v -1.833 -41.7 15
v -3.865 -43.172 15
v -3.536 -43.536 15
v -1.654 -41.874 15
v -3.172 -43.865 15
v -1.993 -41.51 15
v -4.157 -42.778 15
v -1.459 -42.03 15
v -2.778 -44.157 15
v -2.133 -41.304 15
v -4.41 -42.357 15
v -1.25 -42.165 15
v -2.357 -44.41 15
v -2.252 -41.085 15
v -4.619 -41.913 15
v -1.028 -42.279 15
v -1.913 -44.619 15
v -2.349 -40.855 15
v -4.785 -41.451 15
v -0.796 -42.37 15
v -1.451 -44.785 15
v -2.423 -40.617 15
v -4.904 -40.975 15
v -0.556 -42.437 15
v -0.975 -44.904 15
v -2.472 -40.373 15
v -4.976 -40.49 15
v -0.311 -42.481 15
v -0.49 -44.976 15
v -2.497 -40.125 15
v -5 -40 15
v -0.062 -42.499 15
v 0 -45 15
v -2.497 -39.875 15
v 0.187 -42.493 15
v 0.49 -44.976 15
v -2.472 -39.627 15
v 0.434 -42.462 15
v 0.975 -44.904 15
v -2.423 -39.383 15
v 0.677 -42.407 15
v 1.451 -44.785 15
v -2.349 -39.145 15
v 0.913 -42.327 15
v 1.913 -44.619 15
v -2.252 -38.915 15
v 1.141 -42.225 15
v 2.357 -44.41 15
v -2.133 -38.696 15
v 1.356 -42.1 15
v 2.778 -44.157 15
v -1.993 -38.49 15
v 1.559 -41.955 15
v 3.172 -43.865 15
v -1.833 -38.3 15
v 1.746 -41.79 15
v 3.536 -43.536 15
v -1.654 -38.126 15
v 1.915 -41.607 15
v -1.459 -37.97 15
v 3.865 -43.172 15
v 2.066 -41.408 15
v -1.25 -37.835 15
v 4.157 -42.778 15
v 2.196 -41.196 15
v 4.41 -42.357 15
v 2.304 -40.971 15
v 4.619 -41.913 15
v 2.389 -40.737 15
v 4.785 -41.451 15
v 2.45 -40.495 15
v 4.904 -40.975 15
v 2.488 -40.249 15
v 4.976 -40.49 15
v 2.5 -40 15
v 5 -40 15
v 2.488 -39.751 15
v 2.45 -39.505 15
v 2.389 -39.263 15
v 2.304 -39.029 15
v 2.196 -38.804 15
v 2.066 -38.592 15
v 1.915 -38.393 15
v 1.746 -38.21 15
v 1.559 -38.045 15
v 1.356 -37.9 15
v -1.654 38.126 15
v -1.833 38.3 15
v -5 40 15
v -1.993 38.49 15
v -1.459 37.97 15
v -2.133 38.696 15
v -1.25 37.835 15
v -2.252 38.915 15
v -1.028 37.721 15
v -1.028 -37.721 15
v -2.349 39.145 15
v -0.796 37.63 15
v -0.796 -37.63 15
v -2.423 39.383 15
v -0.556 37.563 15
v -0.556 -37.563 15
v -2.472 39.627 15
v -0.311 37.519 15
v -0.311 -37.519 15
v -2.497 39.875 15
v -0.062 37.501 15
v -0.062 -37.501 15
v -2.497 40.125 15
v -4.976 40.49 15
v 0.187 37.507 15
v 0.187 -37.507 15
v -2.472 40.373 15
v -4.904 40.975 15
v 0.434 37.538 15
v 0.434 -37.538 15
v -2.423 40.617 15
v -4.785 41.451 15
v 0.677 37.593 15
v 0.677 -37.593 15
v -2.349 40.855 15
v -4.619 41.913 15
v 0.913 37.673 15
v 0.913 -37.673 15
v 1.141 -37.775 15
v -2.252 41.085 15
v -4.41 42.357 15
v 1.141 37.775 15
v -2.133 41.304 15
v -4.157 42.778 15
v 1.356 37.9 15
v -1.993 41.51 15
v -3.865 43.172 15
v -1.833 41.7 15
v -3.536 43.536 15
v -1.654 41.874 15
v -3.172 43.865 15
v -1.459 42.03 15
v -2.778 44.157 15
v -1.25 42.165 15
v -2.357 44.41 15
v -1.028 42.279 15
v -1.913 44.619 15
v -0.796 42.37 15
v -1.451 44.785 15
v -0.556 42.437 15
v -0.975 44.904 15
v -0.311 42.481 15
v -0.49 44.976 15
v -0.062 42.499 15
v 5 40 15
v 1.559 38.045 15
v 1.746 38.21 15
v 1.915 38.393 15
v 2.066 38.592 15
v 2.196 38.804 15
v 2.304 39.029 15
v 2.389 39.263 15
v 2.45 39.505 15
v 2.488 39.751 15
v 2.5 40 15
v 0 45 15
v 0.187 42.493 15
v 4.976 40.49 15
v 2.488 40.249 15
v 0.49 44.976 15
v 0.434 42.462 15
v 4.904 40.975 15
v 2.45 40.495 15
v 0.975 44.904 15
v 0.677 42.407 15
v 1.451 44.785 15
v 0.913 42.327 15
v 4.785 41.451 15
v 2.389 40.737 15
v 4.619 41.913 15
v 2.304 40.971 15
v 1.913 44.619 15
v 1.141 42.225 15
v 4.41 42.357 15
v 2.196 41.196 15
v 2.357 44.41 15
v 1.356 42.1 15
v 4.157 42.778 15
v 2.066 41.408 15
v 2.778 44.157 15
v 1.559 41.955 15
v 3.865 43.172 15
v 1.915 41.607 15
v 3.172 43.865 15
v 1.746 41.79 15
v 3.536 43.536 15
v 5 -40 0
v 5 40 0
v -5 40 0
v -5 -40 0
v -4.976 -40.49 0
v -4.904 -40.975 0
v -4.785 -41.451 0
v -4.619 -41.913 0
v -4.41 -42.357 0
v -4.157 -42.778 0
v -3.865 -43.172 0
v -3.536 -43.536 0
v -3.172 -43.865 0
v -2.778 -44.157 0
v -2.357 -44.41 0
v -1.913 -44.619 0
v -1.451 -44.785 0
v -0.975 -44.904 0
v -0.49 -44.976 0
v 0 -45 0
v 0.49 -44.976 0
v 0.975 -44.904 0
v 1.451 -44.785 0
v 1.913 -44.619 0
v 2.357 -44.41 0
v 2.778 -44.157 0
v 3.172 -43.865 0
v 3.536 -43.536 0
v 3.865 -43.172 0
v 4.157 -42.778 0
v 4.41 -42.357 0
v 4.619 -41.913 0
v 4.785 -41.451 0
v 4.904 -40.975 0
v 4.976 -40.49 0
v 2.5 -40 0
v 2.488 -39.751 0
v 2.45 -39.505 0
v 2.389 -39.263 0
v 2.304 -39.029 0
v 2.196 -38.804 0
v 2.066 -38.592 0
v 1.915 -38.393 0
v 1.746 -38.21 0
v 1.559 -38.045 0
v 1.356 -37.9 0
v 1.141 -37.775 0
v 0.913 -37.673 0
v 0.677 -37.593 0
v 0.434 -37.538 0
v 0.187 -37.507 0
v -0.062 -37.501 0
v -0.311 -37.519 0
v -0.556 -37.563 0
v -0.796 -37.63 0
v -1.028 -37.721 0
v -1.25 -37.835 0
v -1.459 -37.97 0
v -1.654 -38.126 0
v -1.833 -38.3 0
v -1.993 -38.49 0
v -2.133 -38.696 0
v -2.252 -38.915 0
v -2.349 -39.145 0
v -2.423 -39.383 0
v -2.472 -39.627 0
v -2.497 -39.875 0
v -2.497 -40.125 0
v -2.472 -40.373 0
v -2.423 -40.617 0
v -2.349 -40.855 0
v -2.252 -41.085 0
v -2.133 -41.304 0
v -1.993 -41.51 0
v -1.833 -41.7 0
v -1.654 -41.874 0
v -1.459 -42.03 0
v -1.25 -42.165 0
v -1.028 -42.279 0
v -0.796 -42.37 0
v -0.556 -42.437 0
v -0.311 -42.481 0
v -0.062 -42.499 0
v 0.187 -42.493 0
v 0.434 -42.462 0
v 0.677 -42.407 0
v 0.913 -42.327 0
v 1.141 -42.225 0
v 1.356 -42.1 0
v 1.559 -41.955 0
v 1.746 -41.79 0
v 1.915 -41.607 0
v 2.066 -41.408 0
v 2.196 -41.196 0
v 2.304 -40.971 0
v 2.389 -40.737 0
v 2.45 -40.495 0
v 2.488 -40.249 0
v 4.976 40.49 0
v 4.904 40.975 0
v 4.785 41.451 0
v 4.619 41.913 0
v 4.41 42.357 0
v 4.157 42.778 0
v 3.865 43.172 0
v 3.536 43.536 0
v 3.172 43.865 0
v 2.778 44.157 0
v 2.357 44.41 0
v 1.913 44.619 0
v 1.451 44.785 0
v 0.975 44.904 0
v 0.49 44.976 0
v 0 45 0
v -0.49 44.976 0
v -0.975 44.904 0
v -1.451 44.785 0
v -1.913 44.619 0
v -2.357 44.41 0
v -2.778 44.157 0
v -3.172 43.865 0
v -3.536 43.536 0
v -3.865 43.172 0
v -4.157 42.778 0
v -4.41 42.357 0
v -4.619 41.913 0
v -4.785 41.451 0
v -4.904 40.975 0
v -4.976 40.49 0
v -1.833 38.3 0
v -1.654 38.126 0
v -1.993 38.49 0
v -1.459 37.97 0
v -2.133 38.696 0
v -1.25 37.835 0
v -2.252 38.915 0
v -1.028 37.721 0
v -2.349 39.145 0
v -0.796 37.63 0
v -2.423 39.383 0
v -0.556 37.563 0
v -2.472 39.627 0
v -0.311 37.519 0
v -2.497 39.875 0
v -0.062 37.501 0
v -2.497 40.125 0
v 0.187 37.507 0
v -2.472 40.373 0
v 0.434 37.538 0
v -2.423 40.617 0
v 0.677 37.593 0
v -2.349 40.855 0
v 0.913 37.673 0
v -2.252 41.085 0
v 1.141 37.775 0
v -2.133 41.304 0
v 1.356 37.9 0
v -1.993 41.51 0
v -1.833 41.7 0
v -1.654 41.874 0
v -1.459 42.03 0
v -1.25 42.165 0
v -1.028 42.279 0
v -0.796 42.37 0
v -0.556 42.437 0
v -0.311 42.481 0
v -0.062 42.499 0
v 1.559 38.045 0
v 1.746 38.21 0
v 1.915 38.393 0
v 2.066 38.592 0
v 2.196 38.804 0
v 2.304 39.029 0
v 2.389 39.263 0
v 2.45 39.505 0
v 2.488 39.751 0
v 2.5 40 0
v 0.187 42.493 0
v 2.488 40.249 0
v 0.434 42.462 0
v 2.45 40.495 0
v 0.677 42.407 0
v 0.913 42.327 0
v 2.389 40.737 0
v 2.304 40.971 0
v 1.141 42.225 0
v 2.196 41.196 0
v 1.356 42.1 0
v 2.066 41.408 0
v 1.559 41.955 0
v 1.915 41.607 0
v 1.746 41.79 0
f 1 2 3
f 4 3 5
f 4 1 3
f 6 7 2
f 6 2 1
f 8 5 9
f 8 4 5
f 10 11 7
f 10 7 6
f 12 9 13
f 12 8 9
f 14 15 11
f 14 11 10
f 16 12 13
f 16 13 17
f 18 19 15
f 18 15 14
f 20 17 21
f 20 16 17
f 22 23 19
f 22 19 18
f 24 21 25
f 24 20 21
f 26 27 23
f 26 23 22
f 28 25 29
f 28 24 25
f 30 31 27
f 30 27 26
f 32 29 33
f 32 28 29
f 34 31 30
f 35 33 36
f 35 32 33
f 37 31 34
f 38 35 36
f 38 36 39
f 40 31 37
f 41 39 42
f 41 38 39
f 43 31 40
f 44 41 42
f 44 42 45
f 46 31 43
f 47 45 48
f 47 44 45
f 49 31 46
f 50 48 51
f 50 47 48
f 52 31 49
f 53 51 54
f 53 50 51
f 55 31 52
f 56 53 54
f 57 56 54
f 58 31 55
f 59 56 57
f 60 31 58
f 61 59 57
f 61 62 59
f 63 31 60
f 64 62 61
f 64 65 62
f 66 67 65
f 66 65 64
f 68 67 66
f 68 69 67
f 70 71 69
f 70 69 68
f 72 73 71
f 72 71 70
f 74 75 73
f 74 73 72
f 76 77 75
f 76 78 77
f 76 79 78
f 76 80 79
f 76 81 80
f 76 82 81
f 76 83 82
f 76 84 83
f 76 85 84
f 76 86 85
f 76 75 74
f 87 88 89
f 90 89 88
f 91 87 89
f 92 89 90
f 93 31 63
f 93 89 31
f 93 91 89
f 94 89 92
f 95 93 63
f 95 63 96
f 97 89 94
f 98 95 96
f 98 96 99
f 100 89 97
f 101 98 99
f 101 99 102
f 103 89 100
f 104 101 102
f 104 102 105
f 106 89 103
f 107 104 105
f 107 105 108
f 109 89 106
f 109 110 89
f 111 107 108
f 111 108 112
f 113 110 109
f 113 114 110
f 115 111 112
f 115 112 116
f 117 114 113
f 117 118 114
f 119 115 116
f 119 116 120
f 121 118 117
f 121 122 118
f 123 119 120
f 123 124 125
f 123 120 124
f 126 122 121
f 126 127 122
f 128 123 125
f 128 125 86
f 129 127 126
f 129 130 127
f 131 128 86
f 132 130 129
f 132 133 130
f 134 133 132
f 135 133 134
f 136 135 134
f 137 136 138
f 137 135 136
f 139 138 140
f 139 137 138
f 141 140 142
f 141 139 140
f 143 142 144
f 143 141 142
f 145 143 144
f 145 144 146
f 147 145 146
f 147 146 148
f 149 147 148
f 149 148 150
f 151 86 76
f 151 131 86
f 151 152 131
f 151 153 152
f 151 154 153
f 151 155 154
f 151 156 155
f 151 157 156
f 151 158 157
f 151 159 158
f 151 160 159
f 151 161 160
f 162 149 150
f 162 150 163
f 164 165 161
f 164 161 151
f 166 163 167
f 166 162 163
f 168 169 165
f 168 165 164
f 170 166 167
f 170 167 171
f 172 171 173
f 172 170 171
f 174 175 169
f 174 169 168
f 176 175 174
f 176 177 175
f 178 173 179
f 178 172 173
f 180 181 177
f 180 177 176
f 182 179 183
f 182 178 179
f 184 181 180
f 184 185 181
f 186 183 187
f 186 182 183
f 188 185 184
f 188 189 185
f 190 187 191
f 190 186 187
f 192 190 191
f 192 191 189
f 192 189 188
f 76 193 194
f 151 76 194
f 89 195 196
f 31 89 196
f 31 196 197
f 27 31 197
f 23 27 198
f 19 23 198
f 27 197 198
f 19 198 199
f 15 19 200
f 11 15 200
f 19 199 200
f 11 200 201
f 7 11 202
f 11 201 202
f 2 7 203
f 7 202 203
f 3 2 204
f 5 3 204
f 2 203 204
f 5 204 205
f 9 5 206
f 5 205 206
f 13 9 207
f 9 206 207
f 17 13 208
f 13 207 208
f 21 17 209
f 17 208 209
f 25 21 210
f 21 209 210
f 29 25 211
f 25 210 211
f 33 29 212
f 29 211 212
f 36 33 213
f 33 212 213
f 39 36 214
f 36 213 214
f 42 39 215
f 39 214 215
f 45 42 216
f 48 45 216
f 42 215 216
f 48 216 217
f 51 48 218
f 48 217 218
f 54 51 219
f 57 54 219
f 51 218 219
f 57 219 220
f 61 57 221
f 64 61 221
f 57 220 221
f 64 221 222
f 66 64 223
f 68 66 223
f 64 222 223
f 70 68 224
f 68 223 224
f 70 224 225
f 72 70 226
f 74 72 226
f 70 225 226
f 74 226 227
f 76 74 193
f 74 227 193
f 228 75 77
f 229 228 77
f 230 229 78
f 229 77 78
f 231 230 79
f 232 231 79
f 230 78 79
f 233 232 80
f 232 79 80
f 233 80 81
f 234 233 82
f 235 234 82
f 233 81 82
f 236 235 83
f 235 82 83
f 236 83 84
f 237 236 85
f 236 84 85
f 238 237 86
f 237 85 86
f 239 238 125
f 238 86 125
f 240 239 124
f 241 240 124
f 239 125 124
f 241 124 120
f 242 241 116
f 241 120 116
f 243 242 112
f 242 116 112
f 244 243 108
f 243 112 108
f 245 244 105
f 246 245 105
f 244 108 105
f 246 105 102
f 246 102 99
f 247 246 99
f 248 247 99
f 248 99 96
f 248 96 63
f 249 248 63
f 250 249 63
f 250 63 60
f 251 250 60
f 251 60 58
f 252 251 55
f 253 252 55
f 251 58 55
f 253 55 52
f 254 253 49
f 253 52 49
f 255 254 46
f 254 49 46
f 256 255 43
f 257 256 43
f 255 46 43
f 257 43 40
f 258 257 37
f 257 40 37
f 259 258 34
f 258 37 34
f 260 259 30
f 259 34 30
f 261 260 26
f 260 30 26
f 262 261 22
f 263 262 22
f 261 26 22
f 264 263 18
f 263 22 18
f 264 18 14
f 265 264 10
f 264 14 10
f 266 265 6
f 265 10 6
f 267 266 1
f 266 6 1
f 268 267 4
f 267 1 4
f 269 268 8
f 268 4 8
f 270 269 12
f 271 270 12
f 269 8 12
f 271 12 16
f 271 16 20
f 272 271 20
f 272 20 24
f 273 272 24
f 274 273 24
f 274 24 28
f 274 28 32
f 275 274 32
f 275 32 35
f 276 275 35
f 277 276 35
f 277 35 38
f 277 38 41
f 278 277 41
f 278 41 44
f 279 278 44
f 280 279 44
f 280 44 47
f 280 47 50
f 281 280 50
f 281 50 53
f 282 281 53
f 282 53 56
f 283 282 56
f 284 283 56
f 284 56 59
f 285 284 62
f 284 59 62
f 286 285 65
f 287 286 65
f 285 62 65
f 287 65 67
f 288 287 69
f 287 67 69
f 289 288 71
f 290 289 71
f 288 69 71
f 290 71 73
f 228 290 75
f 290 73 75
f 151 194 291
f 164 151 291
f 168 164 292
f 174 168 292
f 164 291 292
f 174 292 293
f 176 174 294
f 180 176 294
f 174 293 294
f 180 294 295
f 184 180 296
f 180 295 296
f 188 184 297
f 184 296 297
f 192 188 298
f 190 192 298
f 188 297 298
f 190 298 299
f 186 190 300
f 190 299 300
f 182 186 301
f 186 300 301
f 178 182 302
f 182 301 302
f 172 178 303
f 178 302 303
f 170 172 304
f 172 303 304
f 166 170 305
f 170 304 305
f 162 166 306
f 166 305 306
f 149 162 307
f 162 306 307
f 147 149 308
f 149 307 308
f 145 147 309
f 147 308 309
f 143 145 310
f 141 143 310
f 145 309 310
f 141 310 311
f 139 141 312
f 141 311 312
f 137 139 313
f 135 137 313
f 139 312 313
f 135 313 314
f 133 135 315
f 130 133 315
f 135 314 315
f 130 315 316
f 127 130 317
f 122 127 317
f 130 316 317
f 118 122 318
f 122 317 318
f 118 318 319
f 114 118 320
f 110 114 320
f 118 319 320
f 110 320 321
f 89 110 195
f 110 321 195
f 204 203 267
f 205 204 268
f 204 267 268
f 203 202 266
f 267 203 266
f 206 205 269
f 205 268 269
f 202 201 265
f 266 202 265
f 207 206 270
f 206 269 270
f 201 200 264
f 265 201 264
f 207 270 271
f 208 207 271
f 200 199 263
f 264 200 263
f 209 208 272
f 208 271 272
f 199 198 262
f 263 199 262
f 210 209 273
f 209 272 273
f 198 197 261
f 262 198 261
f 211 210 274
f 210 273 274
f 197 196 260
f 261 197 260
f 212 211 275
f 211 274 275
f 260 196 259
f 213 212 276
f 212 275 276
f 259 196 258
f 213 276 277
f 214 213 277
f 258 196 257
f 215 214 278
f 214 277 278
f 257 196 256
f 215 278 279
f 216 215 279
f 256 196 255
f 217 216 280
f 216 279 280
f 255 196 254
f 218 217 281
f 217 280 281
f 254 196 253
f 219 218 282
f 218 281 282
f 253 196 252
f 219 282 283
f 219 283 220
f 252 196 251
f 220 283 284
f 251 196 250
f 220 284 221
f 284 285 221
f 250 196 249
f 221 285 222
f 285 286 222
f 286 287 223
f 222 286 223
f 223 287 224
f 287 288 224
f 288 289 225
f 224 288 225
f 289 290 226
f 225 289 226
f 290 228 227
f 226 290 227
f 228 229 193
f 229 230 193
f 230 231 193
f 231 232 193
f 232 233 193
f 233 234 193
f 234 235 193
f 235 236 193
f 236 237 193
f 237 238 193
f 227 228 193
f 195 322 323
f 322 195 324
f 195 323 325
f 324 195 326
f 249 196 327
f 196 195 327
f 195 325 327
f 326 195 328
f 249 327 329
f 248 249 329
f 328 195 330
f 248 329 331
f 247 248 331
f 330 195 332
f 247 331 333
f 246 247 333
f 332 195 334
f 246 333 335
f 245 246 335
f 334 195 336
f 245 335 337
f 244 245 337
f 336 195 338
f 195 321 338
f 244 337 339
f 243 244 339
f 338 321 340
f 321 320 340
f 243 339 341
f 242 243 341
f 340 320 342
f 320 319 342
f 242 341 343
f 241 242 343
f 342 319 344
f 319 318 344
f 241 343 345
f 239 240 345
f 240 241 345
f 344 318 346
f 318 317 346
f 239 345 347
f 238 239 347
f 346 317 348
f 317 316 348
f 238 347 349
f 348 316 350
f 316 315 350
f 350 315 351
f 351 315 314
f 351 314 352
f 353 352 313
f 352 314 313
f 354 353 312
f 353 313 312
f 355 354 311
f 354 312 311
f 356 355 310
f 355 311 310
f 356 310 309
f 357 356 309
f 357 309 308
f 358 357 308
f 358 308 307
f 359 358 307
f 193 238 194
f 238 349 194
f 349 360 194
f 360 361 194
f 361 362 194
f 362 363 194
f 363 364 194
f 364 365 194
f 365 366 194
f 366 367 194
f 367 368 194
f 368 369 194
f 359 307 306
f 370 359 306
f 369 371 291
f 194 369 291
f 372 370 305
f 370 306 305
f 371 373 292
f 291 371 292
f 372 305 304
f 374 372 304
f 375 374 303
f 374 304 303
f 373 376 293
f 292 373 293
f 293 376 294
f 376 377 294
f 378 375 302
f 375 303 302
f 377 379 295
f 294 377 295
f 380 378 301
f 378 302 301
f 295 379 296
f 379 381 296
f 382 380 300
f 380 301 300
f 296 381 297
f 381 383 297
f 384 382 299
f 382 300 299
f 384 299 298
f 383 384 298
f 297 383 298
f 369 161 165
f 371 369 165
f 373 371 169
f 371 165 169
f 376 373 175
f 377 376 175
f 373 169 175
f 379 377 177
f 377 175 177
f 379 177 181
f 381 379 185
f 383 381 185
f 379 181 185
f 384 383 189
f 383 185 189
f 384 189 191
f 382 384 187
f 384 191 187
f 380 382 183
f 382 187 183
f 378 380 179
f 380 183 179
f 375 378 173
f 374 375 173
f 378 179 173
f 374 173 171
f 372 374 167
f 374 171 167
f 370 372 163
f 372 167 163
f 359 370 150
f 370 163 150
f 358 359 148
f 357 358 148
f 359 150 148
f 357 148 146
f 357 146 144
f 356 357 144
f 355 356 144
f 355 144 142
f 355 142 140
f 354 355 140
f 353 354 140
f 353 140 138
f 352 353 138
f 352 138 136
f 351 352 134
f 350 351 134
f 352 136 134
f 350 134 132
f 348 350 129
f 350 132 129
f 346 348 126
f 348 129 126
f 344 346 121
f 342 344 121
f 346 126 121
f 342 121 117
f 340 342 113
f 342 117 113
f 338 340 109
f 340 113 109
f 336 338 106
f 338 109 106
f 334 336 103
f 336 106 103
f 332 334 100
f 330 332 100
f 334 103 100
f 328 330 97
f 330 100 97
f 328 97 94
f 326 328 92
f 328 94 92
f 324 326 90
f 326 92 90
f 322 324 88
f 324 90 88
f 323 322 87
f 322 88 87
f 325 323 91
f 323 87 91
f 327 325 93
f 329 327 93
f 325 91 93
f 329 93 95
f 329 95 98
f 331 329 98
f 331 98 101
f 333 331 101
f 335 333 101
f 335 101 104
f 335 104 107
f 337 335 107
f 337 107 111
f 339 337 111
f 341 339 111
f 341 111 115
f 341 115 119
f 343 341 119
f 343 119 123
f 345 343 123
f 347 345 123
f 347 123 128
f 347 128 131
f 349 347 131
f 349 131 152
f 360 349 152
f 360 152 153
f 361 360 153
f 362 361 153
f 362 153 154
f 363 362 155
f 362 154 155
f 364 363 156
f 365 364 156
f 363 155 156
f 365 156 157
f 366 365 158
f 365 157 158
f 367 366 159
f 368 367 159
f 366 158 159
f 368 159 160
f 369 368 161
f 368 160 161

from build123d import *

# Parameters (mm, degrees)
BOSS_EXTRUDE1_DEPTH = 15
SKETCH2_R           = 2.5
CUT_EXTRUDE1_DEPTH  = 15


with BuildPart() as part:
    # Sketch1 → Boss-Extrude1 (new body)
    with BuildSketch(Plane.XY):
        with BuildLine():
            ThreePointArc((5, 40), (0, 35), (-5, 40))
            Line((-5, 40), (-5, -40))
            ThreePointArc((-5, -40), (0, -35), (5, -40))
            Line((5, -40), (5, 40))
        make_face()
        with BuildLine():
            ThreePointArc((5, 40), (0, 45), (-5, 40))
            Line((-5, 40), (5, 40))
        make_face()
        with BuildLine():
            Line((5, 40), (-5, 40))
            ThreePointArc((-5, 40), (0, 35), (5, 40))
        make_face()
        with BuildLine():
            ThreePointArc((5, -40), (0, -35), (-5, -40))
            Line((-5, -40), (5, -40))
        make_face()
        with BuildLine():
            Line((5, -40), (-5, -40))
            ThreePointArc((-5, -40), (0, -45), (5, -40))
        make_face()
    extrude(amount=BOSS_EXTRUDE1_DEPTH)

    # Sketch2 → Cut-Extrude1 (cut)
    with BuildSketch(Plane.XY.offset(15)):
        with Locations((0, 40)):
            Circle(SKETCH2_R)
        with Locations((0, -40)):
            Circle(SKETCH2_R)
    extrude(amount=-CUT_EXTRUDE1_DEPTH, mode=Mode.SUBTRACT)


solid = part.part
